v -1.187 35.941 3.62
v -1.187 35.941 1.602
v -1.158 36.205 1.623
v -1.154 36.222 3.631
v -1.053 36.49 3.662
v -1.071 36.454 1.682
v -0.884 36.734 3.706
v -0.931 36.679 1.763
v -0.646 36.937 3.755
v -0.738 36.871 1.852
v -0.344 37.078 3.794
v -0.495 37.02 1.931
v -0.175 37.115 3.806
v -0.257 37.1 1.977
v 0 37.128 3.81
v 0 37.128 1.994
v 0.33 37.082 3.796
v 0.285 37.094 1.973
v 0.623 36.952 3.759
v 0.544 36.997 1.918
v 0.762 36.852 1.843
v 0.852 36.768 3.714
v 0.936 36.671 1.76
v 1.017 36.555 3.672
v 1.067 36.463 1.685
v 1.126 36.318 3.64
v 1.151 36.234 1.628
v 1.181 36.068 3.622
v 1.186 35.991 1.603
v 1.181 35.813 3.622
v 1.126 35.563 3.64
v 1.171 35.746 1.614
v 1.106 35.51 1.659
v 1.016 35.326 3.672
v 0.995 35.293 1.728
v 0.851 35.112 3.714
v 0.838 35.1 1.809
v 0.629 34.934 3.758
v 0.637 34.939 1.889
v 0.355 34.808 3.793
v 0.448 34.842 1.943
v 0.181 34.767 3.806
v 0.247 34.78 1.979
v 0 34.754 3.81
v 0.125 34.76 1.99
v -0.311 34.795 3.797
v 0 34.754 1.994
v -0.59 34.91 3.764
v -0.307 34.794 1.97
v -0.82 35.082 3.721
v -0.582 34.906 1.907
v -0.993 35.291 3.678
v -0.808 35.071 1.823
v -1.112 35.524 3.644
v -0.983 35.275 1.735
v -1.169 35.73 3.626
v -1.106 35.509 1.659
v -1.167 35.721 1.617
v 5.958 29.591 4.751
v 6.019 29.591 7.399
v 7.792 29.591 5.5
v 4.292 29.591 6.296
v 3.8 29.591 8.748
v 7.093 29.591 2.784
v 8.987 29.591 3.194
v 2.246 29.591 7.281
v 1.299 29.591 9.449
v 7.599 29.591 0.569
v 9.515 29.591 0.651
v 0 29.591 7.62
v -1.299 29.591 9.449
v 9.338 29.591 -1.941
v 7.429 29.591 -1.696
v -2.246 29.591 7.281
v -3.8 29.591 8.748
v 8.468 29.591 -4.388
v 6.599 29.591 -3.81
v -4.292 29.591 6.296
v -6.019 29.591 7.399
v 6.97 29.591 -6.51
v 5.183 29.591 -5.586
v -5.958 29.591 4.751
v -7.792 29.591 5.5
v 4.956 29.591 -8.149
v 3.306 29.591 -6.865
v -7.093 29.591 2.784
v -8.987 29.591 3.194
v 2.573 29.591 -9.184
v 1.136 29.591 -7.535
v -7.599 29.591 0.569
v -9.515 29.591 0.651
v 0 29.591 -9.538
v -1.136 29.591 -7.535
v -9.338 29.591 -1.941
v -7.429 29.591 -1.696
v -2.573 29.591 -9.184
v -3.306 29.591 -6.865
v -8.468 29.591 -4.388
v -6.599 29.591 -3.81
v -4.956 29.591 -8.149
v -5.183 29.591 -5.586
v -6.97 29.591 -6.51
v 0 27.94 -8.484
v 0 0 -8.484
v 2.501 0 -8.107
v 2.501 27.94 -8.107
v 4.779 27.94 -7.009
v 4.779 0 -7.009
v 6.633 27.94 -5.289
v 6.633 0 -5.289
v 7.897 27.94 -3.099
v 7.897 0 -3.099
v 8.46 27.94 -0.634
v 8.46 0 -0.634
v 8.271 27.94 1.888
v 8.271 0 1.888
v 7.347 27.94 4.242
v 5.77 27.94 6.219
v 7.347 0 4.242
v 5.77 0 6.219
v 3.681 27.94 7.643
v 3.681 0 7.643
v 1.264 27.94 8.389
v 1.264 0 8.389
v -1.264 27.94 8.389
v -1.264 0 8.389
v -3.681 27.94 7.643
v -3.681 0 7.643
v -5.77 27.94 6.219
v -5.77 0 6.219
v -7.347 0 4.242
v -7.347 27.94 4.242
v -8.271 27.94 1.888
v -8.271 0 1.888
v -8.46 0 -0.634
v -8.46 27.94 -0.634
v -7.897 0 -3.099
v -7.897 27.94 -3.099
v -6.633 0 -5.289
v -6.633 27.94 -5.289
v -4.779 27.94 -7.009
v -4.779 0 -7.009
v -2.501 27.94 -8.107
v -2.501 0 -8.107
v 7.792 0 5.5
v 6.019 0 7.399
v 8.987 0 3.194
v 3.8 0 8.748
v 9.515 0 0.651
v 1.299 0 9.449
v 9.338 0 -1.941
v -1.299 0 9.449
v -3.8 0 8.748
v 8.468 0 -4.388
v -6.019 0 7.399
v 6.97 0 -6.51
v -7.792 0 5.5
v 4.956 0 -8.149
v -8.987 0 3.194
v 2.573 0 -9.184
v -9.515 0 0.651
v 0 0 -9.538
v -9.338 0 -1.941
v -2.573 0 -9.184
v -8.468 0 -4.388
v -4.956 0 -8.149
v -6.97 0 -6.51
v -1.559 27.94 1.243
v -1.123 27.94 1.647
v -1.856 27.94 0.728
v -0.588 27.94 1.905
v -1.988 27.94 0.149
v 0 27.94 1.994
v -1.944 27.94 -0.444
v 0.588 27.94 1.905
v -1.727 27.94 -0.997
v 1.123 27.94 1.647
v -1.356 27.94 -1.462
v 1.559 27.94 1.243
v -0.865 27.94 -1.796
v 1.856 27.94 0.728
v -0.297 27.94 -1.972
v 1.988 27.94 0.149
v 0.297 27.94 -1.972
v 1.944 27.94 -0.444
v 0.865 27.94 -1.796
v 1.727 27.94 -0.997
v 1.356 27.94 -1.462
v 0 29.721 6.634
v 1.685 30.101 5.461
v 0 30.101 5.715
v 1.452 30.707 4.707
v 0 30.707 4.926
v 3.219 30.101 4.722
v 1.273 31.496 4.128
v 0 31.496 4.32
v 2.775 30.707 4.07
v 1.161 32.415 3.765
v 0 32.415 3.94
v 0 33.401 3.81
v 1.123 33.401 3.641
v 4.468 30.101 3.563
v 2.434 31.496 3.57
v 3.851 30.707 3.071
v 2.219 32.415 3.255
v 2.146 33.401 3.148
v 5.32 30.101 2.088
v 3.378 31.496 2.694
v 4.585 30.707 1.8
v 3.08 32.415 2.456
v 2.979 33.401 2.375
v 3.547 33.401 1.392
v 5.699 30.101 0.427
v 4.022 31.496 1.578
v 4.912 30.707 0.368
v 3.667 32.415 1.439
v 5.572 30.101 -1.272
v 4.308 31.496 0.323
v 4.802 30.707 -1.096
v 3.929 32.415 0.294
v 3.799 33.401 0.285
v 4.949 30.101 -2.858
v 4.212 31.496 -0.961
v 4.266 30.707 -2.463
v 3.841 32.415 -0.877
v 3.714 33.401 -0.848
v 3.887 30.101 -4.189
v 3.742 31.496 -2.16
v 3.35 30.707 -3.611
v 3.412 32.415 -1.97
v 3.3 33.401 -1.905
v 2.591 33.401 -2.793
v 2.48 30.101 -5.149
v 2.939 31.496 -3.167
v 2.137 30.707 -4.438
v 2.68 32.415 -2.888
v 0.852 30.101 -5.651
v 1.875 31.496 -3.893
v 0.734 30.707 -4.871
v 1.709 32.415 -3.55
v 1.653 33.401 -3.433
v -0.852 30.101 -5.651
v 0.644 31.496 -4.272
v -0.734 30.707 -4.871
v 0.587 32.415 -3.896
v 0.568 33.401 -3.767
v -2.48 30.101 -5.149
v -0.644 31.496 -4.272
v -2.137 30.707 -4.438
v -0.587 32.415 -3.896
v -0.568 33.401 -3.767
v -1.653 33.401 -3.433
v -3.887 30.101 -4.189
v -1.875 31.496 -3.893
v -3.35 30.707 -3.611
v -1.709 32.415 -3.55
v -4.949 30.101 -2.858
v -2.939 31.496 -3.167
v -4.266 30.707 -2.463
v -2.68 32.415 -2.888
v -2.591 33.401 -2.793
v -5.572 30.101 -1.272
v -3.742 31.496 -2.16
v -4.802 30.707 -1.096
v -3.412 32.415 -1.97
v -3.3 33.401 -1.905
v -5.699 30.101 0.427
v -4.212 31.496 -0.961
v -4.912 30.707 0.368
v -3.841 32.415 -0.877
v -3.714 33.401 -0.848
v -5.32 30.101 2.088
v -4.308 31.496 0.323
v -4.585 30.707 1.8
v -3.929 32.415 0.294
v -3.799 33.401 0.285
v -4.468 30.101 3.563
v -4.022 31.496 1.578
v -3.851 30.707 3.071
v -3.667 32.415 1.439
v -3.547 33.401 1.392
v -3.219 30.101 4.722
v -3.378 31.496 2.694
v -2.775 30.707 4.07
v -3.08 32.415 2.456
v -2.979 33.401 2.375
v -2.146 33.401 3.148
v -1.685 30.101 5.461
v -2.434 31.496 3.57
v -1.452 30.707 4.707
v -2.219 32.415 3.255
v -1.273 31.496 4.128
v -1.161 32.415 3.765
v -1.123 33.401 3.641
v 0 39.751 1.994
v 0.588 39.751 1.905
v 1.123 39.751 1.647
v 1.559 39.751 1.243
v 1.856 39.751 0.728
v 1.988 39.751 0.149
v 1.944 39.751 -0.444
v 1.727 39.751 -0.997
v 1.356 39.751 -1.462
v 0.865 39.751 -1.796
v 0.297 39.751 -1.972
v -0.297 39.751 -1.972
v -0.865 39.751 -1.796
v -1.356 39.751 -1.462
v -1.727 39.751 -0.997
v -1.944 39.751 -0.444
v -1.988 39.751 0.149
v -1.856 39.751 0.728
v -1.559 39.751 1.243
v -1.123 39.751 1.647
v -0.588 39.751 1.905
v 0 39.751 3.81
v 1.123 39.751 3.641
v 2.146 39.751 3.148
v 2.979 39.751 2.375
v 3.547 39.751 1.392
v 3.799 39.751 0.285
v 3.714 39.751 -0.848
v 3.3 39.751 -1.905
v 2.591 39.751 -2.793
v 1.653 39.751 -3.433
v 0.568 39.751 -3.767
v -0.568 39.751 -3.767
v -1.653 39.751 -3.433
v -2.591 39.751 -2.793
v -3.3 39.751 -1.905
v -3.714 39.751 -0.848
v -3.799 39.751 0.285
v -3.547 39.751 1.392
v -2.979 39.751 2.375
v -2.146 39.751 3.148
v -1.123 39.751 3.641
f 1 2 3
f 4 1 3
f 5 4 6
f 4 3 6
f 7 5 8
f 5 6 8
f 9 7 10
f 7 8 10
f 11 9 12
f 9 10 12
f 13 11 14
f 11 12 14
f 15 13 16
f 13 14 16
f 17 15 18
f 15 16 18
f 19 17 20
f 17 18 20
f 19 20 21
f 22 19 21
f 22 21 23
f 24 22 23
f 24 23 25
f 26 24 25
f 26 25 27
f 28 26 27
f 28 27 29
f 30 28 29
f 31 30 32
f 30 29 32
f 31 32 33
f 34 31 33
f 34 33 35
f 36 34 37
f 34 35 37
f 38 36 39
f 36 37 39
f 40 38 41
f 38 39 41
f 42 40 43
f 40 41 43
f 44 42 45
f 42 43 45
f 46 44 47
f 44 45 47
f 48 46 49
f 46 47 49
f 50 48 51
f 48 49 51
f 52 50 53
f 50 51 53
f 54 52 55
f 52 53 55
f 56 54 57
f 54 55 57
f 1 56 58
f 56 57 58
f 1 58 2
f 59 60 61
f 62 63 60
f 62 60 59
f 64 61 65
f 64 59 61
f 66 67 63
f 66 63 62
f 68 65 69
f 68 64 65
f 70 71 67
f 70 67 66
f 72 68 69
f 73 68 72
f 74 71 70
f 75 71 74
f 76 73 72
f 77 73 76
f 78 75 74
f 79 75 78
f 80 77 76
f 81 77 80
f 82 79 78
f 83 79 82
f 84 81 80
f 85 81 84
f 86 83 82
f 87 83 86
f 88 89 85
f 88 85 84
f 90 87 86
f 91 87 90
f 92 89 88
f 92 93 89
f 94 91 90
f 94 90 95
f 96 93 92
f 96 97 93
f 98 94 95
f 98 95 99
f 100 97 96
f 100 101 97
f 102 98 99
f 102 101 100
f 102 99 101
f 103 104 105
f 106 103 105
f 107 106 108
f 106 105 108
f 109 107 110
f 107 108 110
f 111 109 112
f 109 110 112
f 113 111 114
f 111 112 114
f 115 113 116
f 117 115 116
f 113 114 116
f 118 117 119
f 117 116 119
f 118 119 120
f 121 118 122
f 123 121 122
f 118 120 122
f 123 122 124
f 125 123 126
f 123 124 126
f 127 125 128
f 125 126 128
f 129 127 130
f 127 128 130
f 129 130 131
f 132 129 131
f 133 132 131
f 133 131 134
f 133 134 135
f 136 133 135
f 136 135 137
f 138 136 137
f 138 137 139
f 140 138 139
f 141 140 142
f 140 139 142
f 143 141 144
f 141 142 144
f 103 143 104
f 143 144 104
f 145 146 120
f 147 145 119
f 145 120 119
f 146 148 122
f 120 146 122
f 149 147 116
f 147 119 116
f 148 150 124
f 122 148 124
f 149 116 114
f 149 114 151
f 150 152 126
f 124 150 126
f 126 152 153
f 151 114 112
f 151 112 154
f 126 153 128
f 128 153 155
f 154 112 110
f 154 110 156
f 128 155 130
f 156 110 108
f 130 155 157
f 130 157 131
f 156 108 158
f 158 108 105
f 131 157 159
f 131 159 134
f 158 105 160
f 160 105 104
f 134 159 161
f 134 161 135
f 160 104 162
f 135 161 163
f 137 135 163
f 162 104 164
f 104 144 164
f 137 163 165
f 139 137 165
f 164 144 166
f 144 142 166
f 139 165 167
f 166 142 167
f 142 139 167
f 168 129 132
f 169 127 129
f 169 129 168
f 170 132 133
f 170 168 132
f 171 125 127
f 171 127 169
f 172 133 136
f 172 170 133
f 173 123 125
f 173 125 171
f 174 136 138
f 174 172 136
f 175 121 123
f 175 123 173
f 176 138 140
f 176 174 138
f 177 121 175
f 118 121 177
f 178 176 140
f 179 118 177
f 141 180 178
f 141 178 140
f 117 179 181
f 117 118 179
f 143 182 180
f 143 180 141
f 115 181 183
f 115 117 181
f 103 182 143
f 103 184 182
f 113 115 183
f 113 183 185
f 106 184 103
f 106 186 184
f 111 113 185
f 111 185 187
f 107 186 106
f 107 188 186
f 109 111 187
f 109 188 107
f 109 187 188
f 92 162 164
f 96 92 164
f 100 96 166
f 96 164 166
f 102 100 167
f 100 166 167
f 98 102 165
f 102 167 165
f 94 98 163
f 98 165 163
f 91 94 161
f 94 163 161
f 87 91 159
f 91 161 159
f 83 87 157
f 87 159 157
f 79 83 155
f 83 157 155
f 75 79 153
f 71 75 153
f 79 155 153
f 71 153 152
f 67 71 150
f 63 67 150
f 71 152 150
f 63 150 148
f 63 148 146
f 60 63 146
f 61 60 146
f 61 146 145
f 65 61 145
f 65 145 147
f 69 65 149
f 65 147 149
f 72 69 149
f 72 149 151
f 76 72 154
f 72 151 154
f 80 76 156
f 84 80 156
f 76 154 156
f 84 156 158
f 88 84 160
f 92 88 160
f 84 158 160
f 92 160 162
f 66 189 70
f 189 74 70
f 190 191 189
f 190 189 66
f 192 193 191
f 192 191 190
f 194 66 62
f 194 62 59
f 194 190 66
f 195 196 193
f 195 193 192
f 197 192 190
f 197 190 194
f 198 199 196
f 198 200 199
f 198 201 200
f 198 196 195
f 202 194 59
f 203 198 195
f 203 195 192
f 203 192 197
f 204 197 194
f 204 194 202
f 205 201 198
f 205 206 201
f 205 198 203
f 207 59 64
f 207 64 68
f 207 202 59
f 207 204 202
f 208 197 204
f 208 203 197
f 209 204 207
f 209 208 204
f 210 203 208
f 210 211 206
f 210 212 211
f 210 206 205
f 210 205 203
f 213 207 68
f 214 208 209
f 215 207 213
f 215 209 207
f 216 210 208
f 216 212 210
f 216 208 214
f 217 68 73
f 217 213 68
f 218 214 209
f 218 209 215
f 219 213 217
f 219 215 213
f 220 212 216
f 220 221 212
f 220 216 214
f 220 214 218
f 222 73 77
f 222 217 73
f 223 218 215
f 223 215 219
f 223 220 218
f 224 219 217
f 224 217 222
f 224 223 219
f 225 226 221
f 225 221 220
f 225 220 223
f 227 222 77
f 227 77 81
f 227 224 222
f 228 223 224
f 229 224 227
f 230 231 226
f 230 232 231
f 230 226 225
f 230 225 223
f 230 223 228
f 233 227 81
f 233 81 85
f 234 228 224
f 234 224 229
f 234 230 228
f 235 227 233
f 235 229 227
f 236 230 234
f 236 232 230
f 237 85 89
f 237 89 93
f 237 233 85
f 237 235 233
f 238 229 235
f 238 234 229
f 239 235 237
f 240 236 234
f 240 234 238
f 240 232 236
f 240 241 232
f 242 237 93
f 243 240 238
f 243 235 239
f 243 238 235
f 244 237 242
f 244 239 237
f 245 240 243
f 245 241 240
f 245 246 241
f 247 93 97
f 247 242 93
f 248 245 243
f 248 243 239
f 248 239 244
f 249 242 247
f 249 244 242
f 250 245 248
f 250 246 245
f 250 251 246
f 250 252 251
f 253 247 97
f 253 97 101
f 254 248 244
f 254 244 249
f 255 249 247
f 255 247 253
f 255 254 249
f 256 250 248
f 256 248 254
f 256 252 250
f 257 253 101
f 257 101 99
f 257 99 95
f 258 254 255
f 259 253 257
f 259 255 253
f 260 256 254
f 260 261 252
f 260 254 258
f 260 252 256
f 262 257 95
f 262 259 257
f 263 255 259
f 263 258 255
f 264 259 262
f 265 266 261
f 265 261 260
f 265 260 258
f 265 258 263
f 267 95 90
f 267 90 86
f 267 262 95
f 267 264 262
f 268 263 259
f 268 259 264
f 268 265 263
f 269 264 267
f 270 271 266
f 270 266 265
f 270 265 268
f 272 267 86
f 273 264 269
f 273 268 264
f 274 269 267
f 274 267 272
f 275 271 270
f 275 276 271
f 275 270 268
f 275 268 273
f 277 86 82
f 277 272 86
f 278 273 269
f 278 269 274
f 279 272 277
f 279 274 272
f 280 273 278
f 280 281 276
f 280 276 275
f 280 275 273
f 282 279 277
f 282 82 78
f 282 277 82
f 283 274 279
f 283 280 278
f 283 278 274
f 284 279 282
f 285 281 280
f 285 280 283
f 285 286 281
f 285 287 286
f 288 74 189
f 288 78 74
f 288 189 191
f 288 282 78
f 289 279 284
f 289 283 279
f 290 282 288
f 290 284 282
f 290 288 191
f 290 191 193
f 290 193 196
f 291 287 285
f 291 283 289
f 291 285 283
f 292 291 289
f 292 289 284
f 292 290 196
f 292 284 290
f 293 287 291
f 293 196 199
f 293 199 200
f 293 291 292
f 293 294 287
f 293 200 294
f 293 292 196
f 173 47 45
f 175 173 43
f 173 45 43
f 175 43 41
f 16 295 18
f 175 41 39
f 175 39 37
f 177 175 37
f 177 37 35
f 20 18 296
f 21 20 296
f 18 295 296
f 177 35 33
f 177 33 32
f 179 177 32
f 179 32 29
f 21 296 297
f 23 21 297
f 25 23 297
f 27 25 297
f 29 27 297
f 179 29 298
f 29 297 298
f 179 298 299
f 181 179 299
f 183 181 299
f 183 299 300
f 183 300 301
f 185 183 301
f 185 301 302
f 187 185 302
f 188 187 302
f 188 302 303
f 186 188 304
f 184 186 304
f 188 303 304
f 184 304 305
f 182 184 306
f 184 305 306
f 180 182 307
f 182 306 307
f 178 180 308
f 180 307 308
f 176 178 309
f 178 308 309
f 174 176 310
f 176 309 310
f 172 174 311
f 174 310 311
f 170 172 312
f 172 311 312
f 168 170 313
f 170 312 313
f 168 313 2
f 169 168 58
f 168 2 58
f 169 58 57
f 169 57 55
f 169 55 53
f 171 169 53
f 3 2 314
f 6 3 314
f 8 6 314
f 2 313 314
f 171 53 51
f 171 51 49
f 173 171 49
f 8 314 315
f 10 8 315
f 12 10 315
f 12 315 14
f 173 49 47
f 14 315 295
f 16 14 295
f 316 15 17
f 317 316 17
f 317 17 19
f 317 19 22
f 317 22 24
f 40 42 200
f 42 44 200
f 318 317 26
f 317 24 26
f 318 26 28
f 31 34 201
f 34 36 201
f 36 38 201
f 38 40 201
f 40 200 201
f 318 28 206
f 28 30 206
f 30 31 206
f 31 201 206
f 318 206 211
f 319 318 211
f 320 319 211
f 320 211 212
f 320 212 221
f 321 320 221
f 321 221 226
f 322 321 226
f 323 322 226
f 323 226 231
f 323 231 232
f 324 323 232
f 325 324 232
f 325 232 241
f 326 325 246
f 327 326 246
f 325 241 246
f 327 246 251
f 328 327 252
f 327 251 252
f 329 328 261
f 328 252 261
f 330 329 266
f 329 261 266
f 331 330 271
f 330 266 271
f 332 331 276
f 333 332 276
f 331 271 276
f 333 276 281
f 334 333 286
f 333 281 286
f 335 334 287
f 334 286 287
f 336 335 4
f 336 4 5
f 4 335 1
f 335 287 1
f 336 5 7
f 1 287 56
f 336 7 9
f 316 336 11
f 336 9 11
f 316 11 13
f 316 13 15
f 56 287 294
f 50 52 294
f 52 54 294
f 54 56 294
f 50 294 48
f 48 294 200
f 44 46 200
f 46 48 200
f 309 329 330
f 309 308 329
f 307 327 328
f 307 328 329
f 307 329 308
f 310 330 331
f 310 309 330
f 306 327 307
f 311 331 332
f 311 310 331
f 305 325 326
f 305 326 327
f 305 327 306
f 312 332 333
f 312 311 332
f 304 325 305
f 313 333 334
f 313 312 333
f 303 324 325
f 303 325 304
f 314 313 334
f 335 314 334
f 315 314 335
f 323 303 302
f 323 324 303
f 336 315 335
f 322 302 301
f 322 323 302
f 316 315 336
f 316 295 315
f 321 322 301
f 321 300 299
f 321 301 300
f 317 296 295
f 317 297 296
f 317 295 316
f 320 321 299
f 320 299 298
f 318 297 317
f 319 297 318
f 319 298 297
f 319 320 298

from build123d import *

# Parameters (mm, degrees)
SKETCH1_R                 = 9.5377
BOSS_EXTRUDE1_DEPTH       = 29.591
SKETCH2_R                 = 3.81
BOSS_EXTRUDE2_DEPTH       = 10.16
SKETCH3_R                 = 1.9939
CUT_EXTRUDE1_DEPTH        = 12.7
SKETCH4_R                 = 8.4836
CUT_EXTRUDE2_DEPTH        = 27.94
FILLET1_R                 = 3.81
F_4_48_TAPPED_HOLE2_D     = 2.3749
F_4_48_TAPPED_HOLE2_DEPTH = 8.89
F_4_48_TAPPED_HOLE2_TIP   = 0.713491942


with BuildPart() as part:
    # Sketch1 → Boss-Extrude1 (new body)
    with BuildSketch(Plane(origin=(0, 0, 0), x_dir=(1, 0, 0), z_dir=(0, 1, 0))):
        with Locations(Location((0, 0, 0), (0, 0, 90))):
            Circle(SKETCH1_R)
    extrude(amount=BOSS_EXTRUDE1_DEPTH)

    # Sketch2 → Boss-Extrude2 (add)
    with BuildSketch(Plane(origin=(0, 29.591, 0), x_dir=(1, 0, 0), z_dir=(0, 1, 0))):
        with Locations(Location((0, 0, 0), (0, 0, 270))):
            Circle(SKETCH2_R)
    extrude(amount=BOSS_EXTRUDE2_DEPTH)

    # Sketch3 → Cut-Extrude1 (cut)
    with BuildSketch(Plane(origin=(0, 39.751, 0), x_dir=(1, 0, 0), z_dir=(0, 1, 0))):
        with Locations(Location((0, 0, 0), (0, 0, 270))):
            Circle(SKETCH3_R)
    extrude(amount=-CUT_EXTRUDE1_DEPTH, mode=Mode.SUBTRACT)

    # Sketch4 → Cut-Extrude2 (cut)
    with BuildSketch(Plane.XZ):
        with Locations(Location((0, 0, 0), (0, 0, 270))):
            Circle(SKETCH4_R)
    extrude(amount=-CUT_EXTRUDE2_DEPTH, mode=Mode.SUBTRACT)

    # Fillet1
    fillet1_edges = [part.edges().sort_by_distance(p)[0] for p in [
        (0, 29.591, -3.81),
    ]]
    fillet(fillet1_edges, radius=FILLET1_R)

    # #4-48 Tapped Hole2
    with Locations(Plane.XY.offset(9.5377)):
        with Locations((0, 35.941)):
            Hole(F_4_48_TAPPED_HOLE2_D / 2, depth=F_4_48_TAPPED_HOLE2_DEPTH)
            with Locations((0, 0, -(F_4_48_TAPPED_HOLE2_DEPTH + F_4_48_TAPPED_HOLE2_TIP / 2))):  # 118° drill point
                Cone(0, F_4_48_TAPPED_HOLE2_D / 2, F_4_48_TAPPED_HOLE2_TIP, mode=Mode.SUBTRACT)


solid = part.part
